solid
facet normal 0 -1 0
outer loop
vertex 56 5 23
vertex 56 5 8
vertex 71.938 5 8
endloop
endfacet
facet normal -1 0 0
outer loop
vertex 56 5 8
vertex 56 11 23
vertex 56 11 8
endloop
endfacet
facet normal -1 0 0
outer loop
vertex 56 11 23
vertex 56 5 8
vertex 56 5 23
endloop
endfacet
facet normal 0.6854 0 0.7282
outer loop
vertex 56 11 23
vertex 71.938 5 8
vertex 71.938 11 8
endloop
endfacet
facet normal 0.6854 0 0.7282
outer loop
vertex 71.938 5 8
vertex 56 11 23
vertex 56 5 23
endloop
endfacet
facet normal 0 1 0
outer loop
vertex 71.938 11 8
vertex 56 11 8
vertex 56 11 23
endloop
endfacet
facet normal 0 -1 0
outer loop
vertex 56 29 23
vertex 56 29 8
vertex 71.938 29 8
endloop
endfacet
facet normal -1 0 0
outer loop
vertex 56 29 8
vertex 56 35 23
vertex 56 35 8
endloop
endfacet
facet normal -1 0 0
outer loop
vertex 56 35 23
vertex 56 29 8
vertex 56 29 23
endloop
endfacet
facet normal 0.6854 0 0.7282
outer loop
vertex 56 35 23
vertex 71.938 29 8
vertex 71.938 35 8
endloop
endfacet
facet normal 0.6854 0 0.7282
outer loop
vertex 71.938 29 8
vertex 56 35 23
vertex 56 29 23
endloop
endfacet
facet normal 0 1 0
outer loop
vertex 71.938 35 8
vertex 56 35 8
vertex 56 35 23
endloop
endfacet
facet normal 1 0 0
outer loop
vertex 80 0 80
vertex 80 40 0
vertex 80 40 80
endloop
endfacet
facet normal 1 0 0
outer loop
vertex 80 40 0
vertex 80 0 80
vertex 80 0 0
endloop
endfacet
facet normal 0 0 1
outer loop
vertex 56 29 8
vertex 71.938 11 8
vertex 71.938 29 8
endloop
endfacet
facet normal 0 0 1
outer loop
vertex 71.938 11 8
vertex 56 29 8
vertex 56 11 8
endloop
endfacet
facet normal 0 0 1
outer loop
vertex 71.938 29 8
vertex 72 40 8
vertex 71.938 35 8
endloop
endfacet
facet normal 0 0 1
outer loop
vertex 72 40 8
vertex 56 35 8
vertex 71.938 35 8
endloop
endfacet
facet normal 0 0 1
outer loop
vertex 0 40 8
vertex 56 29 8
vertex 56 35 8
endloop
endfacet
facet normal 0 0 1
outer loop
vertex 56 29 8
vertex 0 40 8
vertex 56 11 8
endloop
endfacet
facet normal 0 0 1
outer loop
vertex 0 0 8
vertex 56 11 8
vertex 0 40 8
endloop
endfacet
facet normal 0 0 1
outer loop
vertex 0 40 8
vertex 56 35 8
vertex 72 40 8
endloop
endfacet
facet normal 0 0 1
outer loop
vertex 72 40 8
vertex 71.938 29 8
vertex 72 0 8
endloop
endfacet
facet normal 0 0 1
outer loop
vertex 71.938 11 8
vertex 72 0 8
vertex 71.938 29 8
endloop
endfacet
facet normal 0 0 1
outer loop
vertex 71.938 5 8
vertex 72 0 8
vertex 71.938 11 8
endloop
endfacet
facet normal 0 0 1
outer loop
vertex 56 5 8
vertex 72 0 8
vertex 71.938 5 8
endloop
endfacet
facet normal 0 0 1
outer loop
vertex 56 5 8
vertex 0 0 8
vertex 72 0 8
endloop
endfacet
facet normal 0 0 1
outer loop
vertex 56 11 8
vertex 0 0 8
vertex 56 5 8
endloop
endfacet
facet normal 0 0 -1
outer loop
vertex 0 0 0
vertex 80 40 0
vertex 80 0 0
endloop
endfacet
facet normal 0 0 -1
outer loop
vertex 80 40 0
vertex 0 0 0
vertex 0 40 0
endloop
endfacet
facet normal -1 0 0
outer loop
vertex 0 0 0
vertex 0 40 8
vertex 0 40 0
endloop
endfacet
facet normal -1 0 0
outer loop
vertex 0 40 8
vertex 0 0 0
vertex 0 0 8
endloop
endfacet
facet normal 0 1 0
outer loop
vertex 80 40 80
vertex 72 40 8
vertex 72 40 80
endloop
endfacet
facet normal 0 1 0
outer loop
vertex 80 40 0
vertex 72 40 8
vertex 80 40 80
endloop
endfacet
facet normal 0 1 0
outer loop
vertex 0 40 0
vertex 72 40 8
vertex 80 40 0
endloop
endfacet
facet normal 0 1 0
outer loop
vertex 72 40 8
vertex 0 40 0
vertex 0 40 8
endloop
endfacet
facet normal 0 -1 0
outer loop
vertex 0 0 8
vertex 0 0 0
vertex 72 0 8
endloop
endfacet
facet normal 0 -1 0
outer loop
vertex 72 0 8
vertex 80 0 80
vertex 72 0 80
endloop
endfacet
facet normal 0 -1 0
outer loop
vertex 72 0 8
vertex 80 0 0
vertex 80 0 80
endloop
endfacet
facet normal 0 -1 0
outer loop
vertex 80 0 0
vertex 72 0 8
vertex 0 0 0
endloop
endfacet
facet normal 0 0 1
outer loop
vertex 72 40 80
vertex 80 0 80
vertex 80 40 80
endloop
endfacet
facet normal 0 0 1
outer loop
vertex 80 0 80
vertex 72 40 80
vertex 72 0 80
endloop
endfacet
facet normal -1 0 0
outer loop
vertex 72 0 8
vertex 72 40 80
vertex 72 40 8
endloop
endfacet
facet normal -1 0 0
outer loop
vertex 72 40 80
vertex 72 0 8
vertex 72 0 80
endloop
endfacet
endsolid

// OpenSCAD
$fn = 32;

// ----------------------------------------------------------------------
// Rib bracket: 2-gusset L bracket
// ----------------------------------------------------------------------

// --- parameters (mm) ---
base_l = 80;              // foot length, X
base_w = 40;              // foot width, Y
base_t = 8;               // foot thickness
plate_t = 8;              // upright plate thickness
plate_h = 80;             // overall height
gus_l = 16;               // gusset leg along the foot
gus_h = 16;               // gusset height
gus_t = 6;                // gusset thickness
gus_edge = 5;             // gusset margin from the foot edge
n_gus = 2;                // gusset count

gus_pitch = (base_w - 2 * gus_edge - gus_t) / (n_gus - 1);  // gusset pitch

union() {
  cube([base_l, base_w, base_t]);
  translate([base_l - plate_t, 0, base_t - 1])
    cube([plate_t, base_w, plate_h - base_t + 1]);
  for (i = [0 : n_gus - 1])
    translate([base_l - plate_t - gus_l, gus_edge + i * gus_pitch, base_t - 1])
      rotate([-90, 0, 0])
        linear_extrude(height = gus_t)
          polygon(points = [[0, 0], [gus_l + 1, 0], [0, -gus_h]]);
}
